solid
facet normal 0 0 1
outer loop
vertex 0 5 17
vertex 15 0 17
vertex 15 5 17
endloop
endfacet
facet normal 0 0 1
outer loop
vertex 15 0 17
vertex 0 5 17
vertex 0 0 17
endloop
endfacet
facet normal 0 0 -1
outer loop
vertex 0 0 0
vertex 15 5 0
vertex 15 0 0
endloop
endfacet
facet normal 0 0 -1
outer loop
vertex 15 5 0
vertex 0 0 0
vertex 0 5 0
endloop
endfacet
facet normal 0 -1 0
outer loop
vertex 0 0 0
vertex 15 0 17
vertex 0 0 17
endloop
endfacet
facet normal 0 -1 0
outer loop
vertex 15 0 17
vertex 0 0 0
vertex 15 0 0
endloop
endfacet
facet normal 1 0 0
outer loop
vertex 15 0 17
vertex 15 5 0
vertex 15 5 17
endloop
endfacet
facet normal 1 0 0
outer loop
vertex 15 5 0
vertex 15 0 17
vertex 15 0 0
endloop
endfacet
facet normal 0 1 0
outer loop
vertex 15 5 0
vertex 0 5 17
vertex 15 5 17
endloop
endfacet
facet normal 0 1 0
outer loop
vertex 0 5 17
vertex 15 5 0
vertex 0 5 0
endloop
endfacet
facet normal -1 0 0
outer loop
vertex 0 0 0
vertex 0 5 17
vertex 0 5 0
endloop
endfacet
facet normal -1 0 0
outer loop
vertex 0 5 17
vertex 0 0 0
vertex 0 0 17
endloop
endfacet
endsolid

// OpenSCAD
// Generated by SolidPython 1.0.1 on 2020-07-29 00:46:55


cube(size = [15, 5, 17]);
/***********************************************
*********      SolidPython code:      **********
************************************************
 
# import packages: SolidPython
from solid import *
from solid.utils import *
from itertools import chain, combinations, permutations


class Resize:

    def __init__(self, scad_file):
        self.scad_file = scad_file
        #self.scad_file = import_scad(scad_file)
        # cone/cylinder param:
        self.r1 = 0
        self.r2 = 0
        self.h = 0
        # rectangular prism param:
        self.w = 0
        self.l = 0
        # ellipse param:
        self.r = 0

    # import OpenScad code (file name corresponds to shape)


    # classify shape + parameters
    def assign(self, param1, param2, param3):
        if self.scad_file == 'cone.scad':
            self.r1 = param1
            self.r2 = param2
            self.h = param3
        elif self.scad_file == 'cylinder.scad':
            self.r1 = param1
            self.r2 = param2
            self.h = param3
        elif self.scad_file == 'rectangularPrism.scad':
            self.h = param1
            self.l = param2
            self.w = param3
        else:
            self.r = param1
            self.h = param2

    # resize parameters
    def iterate(self):
        x = range(3, 20, 2)
        i = 1
        if self.scad_file == 'cone.scad':
            tempList = list(permutations(x, 2))
            for temp in tempList:
                param1 = temp[0]
                param2 = temp[1]
                filepath = 'produced_scad_files/' + 'cone' + str(param1) + '_' + str(param2) + '_' + '.scad'
                scad_render_to_file(cylinder(h=param1, r1=param2, r2=0), filepath)

        elif self.scad_file == 'cylinder.scad':
            tempList = list(permutations(x, 3))
            for temp in tempList:
                param1 = temp[0]
                param2 = temp[1]
                filepath = 'produced_scad_files/' + 'cylinder' + str(param1) + '_' + str(param2) + '_' + '.scad'
                scad_render_to_file(cylinder(h=param1, r1=param2, r2=param2), filepath)

        elif self.scad_file == 'rectangularPrism.scad':
            tempList = list(permutations(x, 3))
            for temp in tempList:
                param1 = temp[0]
                param2 = temp[1]
                param3 = temp[2]
                filepath = 'produced_scad_files/' + 'rectangularPrism' + str(param1) + '_' + str(param2) + '_' + str(
                    param3) + '.scad'
                scad_render_to_file(cube(size=(param1, param2, param3)), filepath)

        elif self.scad_file == 'ellipse.scad':
            tempList = list(permutations(x, 4))
            for temp in tempList:
                param1 = temp[0]
                param2 = temp[1]
                param3 = temp[2]
                param4 = temp[3]
                filepath = 'produced_scad_files/' + 'ellipse' + str(param1) + '_' + str(param2) + '_' + str(param3) + '_' + str(param4) + '.scad'
                scad_render_to_file(scale([param1, param2, param3])(sphere(r=param4)), filepath)

    def render_to_scadfile(self):
        scad_render_to_file(scad, 'example.scad') 
 
************************************************/
